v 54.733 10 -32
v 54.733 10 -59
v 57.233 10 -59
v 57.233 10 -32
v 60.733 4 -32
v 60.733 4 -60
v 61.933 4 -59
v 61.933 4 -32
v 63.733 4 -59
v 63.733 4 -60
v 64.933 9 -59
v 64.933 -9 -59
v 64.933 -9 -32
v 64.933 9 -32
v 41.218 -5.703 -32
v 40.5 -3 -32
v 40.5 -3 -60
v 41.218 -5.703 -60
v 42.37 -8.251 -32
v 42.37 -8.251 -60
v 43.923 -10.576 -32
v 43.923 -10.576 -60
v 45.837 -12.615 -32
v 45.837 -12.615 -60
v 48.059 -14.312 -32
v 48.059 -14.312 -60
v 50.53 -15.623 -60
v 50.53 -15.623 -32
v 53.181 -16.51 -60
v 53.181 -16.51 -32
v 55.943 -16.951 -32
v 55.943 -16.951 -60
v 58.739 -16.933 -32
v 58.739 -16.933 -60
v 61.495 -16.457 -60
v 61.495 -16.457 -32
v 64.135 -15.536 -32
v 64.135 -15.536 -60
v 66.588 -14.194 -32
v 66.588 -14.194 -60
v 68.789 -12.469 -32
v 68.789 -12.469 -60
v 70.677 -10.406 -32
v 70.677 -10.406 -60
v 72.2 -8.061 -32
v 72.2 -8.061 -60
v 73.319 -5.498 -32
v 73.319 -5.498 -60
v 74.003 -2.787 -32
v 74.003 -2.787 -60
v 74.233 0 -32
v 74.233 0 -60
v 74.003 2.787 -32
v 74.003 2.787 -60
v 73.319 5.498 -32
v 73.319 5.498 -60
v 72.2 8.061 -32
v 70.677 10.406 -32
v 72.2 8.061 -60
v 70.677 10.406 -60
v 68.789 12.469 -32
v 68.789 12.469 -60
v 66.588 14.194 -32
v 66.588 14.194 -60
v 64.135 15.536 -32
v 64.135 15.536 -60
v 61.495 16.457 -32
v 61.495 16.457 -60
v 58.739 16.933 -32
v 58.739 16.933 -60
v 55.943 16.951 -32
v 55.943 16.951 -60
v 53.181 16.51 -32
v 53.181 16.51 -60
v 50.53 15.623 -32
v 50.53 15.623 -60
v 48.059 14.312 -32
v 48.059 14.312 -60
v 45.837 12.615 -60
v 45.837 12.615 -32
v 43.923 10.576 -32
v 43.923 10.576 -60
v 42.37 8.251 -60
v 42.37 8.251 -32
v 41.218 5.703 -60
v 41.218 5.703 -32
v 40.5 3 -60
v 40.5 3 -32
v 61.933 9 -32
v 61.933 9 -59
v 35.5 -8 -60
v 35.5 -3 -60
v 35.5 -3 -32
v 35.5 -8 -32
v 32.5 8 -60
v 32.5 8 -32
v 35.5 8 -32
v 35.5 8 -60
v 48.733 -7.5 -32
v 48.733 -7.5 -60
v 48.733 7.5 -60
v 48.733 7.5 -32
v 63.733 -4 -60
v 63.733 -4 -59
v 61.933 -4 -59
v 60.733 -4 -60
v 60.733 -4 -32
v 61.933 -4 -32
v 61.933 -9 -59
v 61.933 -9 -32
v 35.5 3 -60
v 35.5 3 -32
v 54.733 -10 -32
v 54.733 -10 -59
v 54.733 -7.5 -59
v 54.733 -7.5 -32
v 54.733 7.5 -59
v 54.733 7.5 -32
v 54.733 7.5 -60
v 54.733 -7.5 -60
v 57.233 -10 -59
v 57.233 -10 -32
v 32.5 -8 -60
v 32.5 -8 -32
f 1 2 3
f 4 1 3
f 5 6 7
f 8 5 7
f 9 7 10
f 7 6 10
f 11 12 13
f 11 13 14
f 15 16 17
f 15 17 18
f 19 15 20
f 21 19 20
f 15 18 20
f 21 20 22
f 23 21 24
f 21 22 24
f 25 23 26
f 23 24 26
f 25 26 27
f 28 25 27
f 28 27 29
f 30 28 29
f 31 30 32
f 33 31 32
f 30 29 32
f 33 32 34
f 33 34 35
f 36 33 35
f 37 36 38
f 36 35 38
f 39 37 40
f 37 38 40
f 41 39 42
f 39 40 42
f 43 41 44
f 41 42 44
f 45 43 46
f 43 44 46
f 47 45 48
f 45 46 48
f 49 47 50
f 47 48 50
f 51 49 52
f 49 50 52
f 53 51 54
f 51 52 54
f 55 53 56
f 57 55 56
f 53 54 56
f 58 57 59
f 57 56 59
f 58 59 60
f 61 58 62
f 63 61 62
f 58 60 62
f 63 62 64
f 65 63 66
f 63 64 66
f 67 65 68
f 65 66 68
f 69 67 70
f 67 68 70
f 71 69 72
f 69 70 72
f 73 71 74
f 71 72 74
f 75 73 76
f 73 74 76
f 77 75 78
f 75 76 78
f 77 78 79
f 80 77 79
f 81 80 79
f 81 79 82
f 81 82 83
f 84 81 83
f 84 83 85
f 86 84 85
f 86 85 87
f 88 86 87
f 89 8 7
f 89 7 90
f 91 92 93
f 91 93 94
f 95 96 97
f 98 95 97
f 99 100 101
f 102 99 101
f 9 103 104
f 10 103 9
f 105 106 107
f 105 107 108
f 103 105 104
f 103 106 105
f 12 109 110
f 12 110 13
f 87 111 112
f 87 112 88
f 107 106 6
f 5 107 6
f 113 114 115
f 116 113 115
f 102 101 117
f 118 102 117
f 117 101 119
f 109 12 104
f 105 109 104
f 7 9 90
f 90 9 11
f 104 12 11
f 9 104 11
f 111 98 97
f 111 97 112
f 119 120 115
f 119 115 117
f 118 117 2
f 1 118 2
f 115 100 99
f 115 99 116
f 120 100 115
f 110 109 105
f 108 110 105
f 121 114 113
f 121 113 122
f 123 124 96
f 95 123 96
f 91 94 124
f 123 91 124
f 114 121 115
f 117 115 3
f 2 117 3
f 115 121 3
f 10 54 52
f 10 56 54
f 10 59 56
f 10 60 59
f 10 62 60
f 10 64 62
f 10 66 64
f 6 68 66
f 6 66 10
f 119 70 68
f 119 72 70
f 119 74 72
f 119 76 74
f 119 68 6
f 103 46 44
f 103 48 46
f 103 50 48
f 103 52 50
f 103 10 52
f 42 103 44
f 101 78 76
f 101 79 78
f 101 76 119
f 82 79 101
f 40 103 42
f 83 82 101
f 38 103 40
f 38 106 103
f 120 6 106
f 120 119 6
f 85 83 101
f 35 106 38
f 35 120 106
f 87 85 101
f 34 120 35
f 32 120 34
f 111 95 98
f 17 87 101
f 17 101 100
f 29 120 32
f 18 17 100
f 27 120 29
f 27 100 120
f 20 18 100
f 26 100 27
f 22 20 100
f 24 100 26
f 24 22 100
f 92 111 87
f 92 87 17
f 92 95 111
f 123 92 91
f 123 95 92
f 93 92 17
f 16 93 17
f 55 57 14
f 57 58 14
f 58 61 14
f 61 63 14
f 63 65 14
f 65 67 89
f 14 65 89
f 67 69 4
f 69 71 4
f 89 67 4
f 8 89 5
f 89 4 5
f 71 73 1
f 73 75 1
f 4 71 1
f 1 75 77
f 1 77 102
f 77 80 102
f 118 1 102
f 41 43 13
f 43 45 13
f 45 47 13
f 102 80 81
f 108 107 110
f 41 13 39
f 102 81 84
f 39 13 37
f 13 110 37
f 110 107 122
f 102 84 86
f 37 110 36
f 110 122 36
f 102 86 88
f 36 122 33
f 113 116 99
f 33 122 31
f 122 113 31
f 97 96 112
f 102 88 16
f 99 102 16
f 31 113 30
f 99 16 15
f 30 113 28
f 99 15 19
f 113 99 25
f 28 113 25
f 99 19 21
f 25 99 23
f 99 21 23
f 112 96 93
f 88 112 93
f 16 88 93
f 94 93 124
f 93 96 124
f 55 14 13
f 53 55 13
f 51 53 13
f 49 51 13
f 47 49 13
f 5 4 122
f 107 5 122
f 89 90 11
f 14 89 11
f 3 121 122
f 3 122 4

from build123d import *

# Parameters (mm, degrees)
PAD006_DEPTH            = 28
SKETCH015_W             = 8
SKETCH015_H             = 3
SKETCH015_W_2           = 15
SKETCH015_H_2           = 6
POCKET006_DEPTH         = 28.001
SKETCH016_W             = 20
SKETCH016_H             = 2.5
SKETCH016_W_2           = 18
SKETCH016_H_2           = 3
POCKET007_DEPTH         = 27.001
BODY005_PLACEMENT_ANGLE = 90


with BuildPart() as part:
    # Sketch014 → Pad006 (new body)
    with BuildSketch(Plane.XY):
        with BuildLine():
            Line((-3, -3), (-8, -3))
            Line((-8, -3), (-8, 0))
            Line((-8, 0), (8, 0))
            Line((8, 0), (8, -3))
            Line((8, -3), (3, -3))
            Line((3, -3), (3, -8))
            ThreePointArc((-3, -8), (0, -41.733201), (3, -8))
            Line((-3, -3), (-3, -8))
        make_face()
    extrude(amount=PAD006_DEPTH)

    # Sketch015 (on Face9 of Pad006) → Pocket006 (cut, through all)
    with BuildSketch(Plane(origin=(0, 0, 0), x_dir=(1, 0, 0), z_dir=(0, 0, -1))):
        with Locations((0, 29.733201)):
            Rectangle(SKETCH015_W, SKETCH015_H)
        with Locations((0, 19.233201)):
            Rectangle(SKETCH015_W_2, SKETCH015_H_2)
    extrude(amount=-POCKET006_DEPTH, mode=Mode.SUBTRACT)

    # Sketch016 (on Face4 of Pocket006) → Pocket007 (cut, through all)
    with BuildSketch(Plane(origin=(0, 0, 1), x_dir=(1, 0, 0), z_dir=(0, 0, -1))):
        with Locations((0, 23.483201)):
            Rectangle(SKETCH016_W, SKETCH016_H)
        with Locations((0, 30.933201)):
            Rectangle(SKETCH016_W_2, SKETCH016_H_2)
    extrude(amount=-POCKET007_DEPTH, mode=Mode.SUBTRACT)


with BuildPart() as part_1:
    # Body005 placement: moved
    add(part.part.moved(Location((32.5, 0, -60))).rotate(Axis((32.5, 0, -60), (0, 0, 1)), BODY005_PLACEMENT_ANGLE))


solid = part_1.part
